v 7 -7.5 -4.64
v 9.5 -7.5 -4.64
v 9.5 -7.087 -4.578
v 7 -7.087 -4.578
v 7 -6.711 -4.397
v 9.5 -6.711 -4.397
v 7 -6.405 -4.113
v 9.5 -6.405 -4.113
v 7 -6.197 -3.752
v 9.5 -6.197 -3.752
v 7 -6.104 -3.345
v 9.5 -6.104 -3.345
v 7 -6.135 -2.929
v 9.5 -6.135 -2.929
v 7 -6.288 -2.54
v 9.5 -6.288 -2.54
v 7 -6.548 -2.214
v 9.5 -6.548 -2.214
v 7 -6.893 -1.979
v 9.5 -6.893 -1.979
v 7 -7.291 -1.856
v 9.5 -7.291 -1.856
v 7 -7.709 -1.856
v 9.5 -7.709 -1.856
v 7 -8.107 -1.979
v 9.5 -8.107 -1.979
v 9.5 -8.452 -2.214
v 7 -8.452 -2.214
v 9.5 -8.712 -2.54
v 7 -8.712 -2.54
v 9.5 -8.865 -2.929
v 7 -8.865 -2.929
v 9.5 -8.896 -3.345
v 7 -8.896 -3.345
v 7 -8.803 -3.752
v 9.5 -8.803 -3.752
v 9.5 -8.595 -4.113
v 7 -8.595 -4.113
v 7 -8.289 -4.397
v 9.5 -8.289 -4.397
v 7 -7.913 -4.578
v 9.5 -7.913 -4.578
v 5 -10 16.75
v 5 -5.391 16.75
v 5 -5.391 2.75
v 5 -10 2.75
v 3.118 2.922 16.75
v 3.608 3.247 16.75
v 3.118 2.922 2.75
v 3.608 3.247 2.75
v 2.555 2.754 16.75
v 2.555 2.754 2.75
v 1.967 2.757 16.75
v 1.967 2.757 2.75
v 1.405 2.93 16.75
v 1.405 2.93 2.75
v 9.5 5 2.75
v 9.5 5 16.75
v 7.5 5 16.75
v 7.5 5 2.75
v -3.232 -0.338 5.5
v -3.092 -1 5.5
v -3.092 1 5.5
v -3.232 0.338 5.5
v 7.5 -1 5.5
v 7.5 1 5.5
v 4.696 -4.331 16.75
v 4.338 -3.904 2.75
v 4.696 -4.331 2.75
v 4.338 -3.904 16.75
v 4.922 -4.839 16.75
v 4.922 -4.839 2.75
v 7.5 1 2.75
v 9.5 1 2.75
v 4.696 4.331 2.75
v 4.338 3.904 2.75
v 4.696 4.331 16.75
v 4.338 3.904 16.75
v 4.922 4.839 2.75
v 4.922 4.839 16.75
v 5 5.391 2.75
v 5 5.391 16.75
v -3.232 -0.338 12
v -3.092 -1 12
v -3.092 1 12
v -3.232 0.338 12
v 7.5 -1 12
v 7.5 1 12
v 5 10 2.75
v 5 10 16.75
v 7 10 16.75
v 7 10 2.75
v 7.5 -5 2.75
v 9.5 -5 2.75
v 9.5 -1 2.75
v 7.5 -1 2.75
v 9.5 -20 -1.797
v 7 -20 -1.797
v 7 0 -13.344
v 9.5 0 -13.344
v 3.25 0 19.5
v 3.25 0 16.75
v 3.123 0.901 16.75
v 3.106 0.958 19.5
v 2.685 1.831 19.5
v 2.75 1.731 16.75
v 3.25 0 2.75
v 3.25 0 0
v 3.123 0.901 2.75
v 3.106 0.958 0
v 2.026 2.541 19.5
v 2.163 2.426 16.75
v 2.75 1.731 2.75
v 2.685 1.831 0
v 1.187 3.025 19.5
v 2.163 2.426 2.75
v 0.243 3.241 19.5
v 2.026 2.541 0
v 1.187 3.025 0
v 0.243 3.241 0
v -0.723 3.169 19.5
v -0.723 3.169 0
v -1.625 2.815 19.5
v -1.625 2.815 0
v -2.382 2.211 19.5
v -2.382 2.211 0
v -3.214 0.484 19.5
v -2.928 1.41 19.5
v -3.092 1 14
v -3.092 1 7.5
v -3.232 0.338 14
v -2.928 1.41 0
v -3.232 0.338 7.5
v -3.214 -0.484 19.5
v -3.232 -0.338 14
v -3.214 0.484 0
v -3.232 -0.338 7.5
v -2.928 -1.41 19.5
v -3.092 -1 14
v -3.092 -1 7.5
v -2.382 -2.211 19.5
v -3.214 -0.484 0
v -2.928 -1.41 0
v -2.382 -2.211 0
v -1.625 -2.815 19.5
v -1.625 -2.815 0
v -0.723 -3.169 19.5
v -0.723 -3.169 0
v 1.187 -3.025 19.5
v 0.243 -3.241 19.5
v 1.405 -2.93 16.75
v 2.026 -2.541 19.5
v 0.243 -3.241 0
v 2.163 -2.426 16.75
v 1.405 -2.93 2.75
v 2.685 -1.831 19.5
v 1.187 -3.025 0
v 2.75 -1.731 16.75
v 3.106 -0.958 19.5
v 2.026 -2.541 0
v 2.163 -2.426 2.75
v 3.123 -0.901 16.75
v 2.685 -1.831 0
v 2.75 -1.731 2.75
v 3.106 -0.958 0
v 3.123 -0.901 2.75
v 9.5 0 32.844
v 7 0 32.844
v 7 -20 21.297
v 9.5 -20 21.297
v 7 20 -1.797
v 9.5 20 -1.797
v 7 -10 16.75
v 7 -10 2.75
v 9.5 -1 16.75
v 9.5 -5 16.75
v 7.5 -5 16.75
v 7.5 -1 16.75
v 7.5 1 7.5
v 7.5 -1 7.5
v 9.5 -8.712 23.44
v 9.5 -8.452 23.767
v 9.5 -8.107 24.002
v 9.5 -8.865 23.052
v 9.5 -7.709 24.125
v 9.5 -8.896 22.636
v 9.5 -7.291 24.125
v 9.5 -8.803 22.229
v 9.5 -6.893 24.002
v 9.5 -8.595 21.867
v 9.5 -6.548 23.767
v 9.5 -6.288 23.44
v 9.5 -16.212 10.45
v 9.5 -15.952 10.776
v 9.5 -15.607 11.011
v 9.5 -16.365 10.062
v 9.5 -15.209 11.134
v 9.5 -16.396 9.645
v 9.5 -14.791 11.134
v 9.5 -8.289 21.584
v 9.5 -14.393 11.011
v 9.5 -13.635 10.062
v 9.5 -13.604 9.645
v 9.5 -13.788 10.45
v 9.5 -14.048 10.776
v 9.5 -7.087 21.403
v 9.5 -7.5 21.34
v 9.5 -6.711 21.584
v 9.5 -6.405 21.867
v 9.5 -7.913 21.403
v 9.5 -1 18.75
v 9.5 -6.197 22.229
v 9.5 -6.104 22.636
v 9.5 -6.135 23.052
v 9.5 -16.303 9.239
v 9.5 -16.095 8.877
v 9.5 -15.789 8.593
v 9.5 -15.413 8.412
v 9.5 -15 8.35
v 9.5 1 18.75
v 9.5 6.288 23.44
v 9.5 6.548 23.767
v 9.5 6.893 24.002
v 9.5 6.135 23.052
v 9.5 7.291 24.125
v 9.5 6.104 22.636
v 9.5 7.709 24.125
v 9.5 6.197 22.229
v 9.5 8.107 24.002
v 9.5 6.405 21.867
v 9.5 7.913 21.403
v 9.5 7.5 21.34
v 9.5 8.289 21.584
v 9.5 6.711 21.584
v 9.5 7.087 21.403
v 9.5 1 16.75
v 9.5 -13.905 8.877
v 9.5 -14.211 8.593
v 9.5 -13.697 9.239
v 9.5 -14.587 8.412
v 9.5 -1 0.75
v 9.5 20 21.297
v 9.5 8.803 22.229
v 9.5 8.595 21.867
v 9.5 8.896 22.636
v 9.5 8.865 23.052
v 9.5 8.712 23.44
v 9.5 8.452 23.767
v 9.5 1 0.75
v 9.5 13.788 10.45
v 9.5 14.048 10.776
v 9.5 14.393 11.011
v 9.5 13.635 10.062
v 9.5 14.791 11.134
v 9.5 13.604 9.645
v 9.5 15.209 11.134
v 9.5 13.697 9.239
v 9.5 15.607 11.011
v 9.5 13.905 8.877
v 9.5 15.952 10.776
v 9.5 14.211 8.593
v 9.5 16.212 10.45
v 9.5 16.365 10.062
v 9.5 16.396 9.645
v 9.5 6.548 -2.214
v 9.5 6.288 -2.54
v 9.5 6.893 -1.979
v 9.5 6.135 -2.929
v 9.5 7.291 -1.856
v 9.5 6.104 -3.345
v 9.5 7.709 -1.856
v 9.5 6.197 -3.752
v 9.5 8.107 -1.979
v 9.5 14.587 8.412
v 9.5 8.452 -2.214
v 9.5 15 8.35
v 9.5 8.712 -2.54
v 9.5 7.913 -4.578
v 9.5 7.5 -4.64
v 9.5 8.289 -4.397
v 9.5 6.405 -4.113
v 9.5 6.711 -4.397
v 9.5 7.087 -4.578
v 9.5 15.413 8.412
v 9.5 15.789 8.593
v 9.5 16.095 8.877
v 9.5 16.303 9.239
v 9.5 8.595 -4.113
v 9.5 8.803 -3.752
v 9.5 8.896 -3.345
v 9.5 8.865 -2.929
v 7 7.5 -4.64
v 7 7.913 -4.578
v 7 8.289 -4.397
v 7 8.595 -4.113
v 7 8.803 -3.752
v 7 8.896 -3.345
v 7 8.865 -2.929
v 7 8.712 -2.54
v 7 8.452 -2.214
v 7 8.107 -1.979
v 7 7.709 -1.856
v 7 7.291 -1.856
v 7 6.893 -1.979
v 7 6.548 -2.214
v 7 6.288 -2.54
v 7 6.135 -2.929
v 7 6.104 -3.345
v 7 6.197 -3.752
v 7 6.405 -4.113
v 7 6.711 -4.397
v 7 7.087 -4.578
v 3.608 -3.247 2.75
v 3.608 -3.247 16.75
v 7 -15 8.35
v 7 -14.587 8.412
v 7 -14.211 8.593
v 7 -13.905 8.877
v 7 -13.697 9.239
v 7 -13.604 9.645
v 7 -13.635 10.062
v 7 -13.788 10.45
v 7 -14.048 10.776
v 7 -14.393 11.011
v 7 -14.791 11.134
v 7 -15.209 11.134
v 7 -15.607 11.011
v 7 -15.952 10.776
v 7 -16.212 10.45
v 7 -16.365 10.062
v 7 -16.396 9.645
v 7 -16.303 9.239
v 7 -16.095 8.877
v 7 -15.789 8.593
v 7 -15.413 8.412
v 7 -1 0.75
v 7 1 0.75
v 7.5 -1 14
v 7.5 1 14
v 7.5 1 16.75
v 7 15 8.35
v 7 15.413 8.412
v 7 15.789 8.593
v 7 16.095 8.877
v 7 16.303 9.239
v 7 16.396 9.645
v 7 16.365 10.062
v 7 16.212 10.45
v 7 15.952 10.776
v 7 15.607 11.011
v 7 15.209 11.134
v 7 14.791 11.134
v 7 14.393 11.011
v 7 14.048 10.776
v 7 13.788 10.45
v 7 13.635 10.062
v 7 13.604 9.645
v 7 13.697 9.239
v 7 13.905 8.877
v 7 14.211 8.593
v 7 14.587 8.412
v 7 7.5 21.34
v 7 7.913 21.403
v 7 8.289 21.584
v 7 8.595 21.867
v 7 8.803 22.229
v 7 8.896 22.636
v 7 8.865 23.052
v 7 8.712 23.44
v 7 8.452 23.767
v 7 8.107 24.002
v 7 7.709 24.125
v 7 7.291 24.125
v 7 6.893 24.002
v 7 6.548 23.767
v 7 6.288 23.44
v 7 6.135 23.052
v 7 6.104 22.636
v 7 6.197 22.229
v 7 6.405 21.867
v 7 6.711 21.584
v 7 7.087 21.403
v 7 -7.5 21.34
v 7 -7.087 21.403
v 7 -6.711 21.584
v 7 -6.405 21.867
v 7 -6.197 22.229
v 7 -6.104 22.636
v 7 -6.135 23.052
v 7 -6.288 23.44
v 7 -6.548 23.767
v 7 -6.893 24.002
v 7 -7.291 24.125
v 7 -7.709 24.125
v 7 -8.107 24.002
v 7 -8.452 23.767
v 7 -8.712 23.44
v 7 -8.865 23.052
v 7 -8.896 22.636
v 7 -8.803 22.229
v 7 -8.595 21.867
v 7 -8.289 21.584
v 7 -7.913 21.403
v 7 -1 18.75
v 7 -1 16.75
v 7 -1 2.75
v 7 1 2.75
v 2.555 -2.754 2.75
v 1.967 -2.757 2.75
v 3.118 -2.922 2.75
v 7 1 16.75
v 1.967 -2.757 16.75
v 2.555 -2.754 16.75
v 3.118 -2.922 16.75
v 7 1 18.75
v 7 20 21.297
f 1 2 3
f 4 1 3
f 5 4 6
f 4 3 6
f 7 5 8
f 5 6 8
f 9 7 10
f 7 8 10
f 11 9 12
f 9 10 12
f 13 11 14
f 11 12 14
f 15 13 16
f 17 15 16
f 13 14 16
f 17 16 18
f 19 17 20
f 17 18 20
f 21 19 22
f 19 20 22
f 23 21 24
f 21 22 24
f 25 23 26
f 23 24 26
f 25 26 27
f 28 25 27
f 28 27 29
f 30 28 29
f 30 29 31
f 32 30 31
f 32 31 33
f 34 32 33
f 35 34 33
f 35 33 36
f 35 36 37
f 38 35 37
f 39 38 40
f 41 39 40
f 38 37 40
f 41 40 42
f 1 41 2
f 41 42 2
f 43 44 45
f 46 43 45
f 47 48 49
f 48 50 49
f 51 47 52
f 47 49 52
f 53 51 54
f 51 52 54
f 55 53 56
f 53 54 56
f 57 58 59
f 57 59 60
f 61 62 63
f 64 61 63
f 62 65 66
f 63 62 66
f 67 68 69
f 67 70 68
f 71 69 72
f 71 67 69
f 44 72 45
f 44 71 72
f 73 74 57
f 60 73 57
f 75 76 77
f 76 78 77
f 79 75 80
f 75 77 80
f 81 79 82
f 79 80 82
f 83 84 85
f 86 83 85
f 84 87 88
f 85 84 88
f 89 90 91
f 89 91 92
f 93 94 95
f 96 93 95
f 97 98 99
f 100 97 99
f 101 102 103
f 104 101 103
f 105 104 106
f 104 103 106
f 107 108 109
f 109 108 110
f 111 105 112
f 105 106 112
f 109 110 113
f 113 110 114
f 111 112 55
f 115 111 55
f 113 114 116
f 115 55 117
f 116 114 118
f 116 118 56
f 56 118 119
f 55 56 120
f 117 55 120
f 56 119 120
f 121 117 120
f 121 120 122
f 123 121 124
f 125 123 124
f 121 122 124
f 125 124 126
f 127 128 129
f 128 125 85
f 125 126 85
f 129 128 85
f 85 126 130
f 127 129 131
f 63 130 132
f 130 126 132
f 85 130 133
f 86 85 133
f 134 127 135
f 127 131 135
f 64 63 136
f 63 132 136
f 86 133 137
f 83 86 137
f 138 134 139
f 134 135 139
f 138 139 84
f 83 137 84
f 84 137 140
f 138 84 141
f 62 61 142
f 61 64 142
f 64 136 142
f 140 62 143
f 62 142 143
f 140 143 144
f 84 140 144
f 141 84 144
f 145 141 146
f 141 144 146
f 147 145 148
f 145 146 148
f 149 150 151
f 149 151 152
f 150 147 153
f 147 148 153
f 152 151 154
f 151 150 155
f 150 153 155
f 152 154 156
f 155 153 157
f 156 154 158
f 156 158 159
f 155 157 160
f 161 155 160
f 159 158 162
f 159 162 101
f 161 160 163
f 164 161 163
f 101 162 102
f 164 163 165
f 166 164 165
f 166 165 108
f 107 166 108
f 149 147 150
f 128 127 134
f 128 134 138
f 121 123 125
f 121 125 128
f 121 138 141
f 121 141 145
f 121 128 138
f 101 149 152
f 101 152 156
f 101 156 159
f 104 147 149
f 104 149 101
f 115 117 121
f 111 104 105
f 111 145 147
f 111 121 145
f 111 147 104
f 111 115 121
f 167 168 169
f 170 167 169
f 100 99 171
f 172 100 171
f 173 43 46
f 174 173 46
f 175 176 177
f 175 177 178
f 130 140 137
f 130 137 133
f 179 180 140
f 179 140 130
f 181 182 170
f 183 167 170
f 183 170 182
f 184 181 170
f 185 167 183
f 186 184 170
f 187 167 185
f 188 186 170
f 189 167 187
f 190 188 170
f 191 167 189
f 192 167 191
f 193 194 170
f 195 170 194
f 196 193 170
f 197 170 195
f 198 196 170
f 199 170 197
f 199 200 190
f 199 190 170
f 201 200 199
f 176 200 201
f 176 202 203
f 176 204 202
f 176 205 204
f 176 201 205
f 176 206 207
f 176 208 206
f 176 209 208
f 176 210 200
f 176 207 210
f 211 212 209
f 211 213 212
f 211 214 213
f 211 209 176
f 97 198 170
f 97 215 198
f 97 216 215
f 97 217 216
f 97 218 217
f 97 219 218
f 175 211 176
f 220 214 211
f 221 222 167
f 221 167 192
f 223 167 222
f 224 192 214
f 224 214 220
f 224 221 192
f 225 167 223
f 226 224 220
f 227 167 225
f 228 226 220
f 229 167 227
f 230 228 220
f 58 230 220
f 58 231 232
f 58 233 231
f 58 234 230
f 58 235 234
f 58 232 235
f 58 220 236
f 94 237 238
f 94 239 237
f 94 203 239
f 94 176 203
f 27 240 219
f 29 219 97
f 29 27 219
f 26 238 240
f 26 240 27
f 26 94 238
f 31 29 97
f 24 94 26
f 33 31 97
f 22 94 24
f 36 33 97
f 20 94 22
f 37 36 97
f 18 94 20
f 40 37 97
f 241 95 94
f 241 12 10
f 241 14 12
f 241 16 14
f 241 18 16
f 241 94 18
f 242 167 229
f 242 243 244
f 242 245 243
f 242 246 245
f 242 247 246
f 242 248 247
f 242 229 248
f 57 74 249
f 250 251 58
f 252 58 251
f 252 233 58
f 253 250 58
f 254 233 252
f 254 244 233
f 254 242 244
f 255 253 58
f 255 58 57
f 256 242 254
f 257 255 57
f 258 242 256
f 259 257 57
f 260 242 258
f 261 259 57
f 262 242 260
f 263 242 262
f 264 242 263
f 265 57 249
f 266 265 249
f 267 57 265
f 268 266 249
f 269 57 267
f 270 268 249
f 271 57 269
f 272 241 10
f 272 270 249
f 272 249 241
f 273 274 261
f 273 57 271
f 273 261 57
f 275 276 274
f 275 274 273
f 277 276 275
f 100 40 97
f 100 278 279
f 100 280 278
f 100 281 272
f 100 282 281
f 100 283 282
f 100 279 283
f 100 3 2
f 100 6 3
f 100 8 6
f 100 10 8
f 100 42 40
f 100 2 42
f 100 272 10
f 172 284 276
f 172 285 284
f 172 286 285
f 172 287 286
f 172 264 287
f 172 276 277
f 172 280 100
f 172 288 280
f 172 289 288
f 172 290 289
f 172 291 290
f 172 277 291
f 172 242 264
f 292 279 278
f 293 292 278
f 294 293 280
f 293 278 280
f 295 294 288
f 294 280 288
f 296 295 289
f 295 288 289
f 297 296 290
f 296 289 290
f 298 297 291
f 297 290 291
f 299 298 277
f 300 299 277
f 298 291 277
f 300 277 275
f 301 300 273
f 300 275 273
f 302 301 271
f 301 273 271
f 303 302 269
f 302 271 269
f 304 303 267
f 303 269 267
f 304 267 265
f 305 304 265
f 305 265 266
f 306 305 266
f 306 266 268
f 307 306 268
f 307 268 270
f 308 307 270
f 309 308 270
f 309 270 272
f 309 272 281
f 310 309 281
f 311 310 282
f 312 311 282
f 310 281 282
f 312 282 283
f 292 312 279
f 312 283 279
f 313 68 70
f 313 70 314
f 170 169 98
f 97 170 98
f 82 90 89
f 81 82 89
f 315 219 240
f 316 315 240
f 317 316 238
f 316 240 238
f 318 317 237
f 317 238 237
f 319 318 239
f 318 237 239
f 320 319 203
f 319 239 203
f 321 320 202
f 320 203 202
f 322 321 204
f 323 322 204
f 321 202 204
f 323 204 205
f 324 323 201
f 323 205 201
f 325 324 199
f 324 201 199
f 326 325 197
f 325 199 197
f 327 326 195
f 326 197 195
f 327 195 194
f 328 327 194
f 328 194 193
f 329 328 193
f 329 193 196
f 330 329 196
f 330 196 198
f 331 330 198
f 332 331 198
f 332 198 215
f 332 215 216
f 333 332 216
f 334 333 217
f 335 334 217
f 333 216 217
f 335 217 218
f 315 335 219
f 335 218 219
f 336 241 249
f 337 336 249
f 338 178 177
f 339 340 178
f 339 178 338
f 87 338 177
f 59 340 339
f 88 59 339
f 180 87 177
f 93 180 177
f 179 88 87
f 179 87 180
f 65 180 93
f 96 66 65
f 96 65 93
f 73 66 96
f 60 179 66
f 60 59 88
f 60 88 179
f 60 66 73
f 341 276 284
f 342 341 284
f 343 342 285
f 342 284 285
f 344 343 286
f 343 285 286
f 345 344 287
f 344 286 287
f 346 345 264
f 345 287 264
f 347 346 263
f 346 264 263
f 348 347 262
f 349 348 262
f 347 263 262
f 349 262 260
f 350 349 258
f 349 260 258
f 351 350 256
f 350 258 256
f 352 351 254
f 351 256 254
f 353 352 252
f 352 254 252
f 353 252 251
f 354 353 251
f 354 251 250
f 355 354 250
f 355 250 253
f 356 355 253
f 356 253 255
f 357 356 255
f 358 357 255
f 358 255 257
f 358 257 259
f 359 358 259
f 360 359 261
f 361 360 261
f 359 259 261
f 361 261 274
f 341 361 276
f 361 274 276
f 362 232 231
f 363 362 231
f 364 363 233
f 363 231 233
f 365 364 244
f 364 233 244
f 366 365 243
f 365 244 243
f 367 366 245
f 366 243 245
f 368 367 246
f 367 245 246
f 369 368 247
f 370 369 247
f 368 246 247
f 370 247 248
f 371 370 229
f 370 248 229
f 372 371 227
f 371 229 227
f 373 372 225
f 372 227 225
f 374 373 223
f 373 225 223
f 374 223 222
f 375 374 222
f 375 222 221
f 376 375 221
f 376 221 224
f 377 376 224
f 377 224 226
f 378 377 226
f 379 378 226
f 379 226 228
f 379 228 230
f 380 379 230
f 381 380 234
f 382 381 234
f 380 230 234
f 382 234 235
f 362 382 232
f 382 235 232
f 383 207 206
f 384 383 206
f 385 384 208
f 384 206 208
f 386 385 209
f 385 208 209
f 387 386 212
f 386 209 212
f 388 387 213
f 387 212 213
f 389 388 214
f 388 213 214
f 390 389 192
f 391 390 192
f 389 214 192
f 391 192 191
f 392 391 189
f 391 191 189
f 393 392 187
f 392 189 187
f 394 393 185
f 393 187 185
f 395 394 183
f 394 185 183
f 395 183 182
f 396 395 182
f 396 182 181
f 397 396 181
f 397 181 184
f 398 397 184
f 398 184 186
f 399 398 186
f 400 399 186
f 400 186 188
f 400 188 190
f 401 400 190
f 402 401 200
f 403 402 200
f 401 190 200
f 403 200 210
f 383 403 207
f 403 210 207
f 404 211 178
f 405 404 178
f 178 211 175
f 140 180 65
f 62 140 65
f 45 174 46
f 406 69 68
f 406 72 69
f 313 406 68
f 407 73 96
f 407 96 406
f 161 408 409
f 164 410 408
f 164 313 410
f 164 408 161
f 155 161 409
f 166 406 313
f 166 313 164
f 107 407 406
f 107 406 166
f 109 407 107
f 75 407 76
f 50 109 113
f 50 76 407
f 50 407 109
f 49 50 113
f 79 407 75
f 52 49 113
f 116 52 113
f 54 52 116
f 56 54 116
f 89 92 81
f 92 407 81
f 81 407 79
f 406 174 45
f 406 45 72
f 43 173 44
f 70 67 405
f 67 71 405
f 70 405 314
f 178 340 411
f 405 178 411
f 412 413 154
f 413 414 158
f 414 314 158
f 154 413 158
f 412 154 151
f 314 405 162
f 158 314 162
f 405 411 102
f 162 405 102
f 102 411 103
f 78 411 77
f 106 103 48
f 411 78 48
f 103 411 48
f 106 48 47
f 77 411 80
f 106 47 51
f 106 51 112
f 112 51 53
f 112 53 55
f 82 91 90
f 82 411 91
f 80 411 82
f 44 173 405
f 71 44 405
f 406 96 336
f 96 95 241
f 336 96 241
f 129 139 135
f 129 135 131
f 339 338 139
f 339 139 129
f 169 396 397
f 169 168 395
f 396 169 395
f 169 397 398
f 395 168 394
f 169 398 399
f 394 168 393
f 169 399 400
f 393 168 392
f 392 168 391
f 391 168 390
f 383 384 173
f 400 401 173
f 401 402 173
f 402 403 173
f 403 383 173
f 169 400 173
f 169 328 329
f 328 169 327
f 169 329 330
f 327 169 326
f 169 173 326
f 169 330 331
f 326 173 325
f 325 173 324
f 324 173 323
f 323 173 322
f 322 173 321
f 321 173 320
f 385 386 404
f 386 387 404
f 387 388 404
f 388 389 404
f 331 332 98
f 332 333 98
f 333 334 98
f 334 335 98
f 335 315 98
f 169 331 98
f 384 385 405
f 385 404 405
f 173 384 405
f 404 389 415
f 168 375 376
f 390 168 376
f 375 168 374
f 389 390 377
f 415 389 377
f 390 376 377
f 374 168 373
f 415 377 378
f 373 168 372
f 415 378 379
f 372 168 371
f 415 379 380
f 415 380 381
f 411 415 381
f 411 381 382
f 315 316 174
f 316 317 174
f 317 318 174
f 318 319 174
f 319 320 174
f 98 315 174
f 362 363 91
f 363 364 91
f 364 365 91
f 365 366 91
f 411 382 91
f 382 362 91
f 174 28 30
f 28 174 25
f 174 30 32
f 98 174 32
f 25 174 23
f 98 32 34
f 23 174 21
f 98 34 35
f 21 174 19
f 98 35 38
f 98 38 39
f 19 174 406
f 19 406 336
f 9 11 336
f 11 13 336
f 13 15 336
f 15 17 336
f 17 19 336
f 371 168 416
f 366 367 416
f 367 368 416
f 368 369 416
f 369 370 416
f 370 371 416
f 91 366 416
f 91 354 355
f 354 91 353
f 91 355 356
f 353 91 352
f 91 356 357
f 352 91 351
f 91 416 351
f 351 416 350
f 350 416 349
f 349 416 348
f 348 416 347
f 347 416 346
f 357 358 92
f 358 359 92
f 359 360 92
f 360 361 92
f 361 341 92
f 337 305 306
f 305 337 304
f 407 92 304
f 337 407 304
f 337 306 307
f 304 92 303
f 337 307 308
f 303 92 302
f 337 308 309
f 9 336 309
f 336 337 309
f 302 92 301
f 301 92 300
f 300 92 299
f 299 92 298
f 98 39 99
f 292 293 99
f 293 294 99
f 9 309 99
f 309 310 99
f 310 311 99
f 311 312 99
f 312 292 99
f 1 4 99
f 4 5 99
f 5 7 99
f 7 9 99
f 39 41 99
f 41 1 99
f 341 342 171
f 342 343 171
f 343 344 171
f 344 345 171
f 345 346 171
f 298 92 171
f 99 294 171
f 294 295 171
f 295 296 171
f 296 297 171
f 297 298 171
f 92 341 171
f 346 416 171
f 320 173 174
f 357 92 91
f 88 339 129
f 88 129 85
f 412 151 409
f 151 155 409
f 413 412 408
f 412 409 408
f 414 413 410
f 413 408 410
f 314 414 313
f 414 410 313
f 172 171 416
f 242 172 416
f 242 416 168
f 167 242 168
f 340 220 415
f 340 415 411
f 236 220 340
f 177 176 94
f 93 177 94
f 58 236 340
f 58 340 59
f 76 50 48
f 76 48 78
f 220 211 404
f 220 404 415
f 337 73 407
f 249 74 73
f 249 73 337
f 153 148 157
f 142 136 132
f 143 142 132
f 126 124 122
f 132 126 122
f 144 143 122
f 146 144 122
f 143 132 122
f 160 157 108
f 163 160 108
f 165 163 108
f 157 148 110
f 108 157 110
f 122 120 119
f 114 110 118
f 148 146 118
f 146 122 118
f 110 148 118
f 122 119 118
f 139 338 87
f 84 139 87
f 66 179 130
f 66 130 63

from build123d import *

# Parameters (mm, degrees)
SKETCH_1_R          = 3.25
EXTRUDE_1_DEPTH     = 19.5
SKETCH_2_W          = 14
SKETCH_2_H          = 20
EXTRUDE_2_DEPTH     = 2
EXTRUDE_3_DEPTH     = 14
FILLET_1_R          = 2
EXTRUDE_4_DEPTH     = 2.5
SKETCH_6_W          = 2
SKETCH_6_H          = 2
CUT_EXTRUDE_1_DEPTH = 13.75
SKETCH_7_W          = 14
SKETCH_7_H          = 10
CUT_EXTRUDE_2_DEPTH = 2
SKETCH_8_W          = 2
SKETCH_8_H          = 2
CUT_EXTRUDE_3_DEPTH = 2.5
SKETCH_14_R         = 1.4
CUT_EXTRUDE_4_DEPTH = 2.5


with BuildPart() as part:
    # Sketch 1 → Extrude 1 (new body)
    with BuildSketch(Plane.XY):
        Circle(SKETCH_1_R)
    extrude(amount=EXTRUDE_1_DEPTH)



with BuildPart() as body_2:
    # Sketch 2 → Extrude 2 (new body)
    with BuildSketch(Plane(origin=(5, 0, 0), x_dir=(0, 0, -1), z_dir=(1, 0, 0))):
        with Locations((-9.75, 0)):
            Rectangle(SKETCH_2_W, SKETCH_2_H)
    extrude(amount=EXTRUDE_2_DEPTH)


with BuildPart() as part_1:
    add(part.part)

    add(body_2.part)  # Extrude 3 merges body 2
    # Sketch 3 → Extrude 3 (add)
    with BuildSketch(Plane(origin=(0, 0, 2.75), x_dir=(-1, 0, 0), z_dir=(0, 0, -1))):
        Polygon((0, 0), (-5, 4.5), (-5, -4.5), align=None)
    extrude(amount=-EXTRUDE_3_DEPTH)

    # Fillet 1
    fillet_1_edges = [part_1.edges().sort_by_distance(p)[0] for p in [
        (2.415705975, 2.174135378, 9.75),
        (2.415705975, -2.174135378, 9.75),
        (5, 4.5, 9.75),
        (5, -4.5, 9.75),
    ]]
    fillet(fillet_1_edges, radius=FILLET_1_R)

    # Sketch 5 → Extrude 4 (add)
    with BuildSketch(Plane(origin=(7, 0, 0), x_dir=(0, 0, -1), z_dir=(1, 0, 0))):
        Polygon((-21.297005384, 20), (-32.844010768, 0), (-21.297005384, -20), (1.797005384, -20), (13.344010768, 0), (1.797005384, 20), align=None)
    extrude(amount=EXTRUDE_4_DEPTH)

    # Sketch 6 → Cut-Extrude 1 (cut, through all)
    with BuildSketch(Plane(origin=(9.5, 0, 0), x_dir=(0, 0, -1), z_dir=(1, 0, 0))):
        with Locations((-13, 0)):
            Rectangle(SKETCH_6_W, SKETCH_6_H)
        with Locations((-6.5, 0)):
            Rectangle(SKETCH_6_W, SKETCH_6_H)
    extrude(amount=-CUT_EXTRUDE_1_DEPTH, mode=Mode.SUBTRACT)

    # Sketch 7 → Cut-Extrude 2 (cut)
    with BuildSketch(Plane(origin=(9.5, 0, 0), x_dir=(0, 0, -1), z_dir=(1, 0, 0))):
        with Locations((-9.75, 0)):
            Rectangle(SKETCH_7_W, SKETCH_7_H)
    extrude(amount=-CUT_EXTRUDE_2_DEPTH, mode=Mode.SUBTRACT)

    # Sketch 8 → Cut-Extrude 3 (cut)
    with BuildSketch(Plane(origin=(9.5, 0, 0), x_dir=(0, 0, -1), z_dir=(1, 0, 0))):
        with Locations((-17.75, 0)):
            Rectangle(SKETCH_8_W, SKETCH_8_H)
        with Locations((-1.75, 0)):
            Rectangle(SKETCH_8_W, SKETCH_8_H)
    extrude(amount=-CUT_EXTRUDE_3_DEPTH, mode=Mode.SUBTRACT)

    # Sketch 14 → Cut-Extrude 4 (cut)
    with BuildSketch(Plane(origin=(9.5, 0, 0), x_dir=(0, 0, -1), z_dir=(1, 0, 0))):
        with Locations((-9.75, 15)):
            Circle(SKETCH_14_R)
        with Locations((3.240381057, 7.5)):
            Circle(SKETCH_14_R)
        with Locations((3.240381057, -7.5)):
            Circle(SKETCH_14_R)
        with Locations((-9.75, -15)):
            Circle(SKETCH_14_R)
        with Locations((-22.740381057, -7.5)):
            Circle(SKETCH_14_R)
        with Locations((-22.740381057, 7.5)):
            Circle(SKETCH_14_R)
    extrude(amount=-CUT_EXTRUDE_4_DEPTH, mode=Mode.SUBTRACT)


solid = part_1.part
